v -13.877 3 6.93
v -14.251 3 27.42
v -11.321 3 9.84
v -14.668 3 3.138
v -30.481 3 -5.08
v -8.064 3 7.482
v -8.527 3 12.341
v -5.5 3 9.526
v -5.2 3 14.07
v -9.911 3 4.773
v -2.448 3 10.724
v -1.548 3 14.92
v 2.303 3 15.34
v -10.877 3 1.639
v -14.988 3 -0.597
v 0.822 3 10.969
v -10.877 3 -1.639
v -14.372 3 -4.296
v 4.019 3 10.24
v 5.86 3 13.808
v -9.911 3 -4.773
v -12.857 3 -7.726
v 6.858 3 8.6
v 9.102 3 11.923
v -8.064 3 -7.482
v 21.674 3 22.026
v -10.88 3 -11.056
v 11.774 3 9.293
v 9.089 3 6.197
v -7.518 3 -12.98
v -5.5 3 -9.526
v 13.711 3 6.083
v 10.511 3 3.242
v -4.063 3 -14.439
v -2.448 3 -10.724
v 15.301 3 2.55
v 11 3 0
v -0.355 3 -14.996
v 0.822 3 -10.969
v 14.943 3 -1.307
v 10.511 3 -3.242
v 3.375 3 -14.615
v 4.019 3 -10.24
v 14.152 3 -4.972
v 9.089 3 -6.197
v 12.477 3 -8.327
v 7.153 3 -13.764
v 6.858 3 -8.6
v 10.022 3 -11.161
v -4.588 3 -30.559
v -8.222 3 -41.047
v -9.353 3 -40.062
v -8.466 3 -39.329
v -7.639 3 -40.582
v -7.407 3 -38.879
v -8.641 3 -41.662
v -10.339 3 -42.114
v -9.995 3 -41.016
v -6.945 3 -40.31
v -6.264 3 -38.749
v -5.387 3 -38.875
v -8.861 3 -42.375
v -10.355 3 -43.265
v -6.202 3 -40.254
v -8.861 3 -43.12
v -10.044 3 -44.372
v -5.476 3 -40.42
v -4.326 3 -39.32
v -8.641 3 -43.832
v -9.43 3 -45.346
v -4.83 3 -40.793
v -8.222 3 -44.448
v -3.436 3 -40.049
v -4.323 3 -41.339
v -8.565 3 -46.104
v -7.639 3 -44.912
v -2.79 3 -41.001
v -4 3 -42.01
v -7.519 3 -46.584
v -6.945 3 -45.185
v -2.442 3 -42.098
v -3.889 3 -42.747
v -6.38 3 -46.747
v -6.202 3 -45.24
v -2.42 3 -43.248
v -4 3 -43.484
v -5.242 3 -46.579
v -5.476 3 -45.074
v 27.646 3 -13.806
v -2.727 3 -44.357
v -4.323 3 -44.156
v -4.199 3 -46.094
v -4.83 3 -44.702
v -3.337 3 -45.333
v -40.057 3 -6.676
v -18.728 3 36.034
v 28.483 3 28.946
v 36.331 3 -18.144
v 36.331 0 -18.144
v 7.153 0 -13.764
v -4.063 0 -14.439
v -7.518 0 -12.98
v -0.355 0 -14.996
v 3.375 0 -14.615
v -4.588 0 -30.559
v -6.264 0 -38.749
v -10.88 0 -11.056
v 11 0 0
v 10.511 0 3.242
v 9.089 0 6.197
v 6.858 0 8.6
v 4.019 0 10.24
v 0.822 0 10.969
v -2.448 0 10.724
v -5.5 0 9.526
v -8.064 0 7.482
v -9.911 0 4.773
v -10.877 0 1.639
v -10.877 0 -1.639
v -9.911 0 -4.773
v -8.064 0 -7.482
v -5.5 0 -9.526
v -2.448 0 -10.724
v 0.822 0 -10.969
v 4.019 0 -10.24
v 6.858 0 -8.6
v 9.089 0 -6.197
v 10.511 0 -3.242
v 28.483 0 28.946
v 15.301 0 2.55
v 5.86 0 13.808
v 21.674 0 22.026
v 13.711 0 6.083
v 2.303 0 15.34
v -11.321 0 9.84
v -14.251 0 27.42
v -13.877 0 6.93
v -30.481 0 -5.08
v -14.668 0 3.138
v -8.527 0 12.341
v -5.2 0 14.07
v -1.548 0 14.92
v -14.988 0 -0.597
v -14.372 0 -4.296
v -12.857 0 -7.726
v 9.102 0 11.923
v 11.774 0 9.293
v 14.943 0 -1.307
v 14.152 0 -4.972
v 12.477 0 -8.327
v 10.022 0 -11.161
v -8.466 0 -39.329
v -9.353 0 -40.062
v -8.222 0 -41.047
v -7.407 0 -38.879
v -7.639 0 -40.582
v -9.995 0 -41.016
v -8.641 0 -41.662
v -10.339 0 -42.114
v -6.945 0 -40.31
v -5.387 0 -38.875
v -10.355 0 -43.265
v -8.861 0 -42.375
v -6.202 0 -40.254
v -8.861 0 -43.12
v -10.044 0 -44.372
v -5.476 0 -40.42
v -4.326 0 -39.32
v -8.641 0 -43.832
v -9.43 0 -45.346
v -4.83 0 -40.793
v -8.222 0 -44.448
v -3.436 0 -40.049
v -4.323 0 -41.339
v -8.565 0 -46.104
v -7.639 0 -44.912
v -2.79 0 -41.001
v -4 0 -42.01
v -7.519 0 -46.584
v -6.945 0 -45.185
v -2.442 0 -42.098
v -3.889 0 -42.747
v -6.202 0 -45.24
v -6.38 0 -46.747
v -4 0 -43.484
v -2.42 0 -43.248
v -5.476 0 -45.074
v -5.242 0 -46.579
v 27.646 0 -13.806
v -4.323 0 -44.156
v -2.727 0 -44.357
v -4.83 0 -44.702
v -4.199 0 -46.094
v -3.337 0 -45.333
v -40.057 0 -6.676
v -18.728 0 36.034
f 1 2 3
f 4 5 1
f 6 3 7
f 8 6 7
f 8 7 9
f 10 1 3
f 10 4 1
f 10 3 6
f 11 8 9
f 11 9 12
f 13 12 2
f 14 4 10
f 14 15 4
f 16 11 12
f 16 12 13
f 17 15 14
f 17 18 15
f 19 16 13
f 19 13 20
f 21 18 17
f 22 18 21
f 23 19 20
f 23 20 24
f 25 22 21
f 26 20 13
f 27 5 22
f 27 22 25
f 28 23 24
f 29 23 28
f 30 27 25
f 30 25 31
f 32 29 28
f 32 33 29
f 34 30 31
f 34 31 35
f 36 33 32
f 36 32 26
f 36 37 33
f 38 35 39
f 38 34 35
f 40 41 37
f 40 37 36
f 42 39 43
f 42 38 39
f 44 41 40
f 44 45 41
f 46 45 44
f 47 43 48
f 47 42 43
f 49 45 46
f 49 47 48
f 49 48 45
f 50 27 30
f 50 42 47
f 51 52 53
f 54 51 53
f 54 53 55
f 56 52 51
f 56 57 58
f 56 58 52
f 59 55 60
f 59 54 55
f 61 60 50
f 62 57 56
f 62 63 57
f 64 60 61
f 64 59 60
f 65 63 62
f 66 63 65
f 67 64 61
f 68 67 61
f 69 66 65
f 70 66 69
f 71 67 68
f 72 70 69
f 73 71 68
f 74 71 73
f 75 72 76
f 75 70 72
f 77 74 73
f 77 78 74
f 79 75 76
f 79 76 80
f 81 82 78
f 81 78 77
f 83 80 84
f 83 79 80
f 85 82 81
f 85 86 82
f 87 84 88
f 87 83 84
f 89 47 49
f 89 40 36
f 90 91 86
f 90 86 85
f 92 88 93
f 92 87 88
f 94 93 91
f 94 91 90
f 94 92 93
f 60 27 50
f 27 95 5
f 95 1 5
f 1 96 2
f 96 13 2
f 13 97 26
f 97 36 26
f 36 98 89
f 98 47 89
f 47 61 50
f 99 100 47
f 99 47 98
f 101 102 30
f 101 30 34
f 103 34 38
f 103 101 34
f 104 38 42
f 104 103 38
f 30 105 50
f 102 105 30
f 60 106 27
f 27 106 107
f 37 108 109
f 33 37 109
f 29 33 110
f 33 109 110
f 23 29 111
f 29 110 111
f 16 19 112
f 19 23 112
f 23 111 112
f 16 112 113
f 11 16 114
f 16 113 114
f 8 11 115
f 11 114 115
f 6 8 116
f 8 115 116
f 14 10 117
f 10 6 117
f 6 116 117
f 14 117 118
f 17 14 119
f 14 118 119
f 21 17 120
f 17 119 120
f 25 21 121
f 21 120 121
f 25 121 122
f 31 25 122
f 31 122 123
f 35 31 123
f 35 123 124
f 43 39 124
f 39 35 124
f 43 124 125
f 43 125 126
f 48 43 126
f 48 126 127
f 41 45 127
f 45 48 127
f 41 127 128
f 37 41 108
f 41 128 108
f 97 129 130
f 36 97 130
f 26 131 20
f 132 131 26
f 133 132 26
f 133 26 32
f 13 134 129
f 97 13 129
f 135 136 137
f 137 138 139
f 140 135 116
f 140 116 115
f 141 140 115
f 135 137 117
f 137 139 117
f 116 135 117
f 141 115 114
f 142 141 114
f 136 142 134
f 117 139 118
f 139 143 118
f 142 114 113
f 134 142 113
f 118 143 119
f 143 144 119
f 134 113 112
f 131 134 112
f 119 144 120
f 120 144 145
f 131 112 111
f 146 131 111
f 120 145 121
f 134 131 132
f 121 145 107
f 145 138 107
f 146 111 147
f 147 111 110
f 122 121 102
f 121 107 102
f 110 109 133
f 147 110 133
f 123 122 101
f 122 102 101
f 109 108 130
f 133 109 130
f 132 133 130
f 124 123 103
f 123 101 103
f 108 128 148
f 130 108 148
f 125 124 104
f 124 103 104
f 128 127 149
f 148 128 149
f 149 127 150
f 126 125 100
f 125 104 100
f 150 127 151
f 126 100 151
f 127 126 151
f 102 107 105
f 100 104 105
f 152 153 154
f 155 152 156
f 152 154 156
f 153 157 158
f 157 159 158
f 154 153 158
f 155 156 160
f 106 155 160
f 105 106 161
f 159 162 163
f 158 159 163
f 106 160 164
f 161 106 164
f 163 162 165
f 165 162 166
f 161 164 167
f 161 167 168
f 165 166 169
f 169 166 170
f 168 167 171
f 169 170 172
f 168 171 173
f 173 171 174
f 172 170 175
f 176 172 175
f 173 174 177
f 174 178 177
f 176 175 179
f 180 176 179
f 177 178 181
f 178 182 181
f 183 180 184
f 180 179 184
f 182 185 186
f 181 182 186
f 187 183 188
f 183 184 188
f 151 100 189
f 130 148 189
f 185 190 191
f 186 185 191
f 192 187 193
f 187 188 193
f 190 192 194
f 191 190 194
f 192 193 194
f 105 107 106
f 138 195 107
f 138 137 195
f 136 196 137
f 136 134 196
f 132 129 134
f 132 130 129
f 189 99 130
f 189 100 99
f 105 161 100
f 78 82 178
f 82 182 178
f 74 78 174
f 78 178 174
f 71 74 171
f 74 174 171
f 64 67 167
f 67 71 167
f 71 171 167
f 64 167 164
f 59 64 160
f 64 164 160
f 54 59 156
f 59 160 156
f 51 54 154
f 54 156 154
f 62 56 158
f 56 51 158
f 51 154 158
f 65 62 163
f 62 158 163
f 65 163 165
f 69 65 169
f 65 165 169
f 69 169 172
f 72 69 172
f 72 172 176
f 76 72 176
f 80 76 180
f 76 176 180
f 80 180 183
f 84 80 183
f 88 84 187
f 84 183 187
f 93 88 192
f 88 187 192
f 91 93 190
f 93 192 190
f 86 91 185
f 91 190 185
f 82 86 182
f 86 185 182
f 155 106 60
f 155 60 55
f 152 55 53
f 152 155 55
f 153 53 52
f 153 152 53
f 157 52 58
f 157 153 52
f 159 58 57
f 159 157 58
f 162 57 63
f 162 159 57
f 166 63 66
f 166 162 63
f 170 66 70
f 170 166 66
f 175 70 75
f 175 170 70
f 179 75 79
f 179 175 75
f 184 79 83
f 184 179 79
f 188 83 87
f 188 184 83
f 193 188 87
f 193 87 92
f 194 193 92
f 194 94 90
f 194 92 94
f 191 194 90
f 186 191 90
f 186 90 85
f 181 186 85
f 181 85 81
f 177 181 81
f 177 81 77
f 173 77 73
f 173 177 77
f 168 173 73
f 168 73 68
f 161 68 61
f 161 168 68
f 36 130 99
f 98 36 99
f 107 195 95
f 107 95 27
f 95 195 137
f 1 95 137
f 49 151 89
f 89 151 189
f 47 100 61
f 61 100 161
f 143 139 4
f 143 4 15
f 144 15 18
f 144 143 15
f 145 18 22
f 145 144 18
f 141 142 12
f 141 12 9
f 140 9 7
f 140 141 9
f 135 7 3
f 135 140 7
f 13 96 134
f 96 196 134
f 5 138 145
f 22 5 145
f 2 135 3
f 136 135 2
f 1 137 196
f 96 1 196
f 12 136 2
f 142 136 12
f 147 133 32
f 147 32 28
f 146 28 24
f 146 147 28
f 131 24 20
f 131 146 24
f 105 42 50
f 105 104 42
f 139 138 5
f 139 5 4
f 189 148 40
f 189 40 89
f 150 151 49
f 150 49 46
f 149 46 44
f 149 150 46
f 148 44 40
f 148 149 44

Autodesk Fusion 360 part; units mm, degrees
sketch "草图1" plane through (0, 0, 0) normal (0, 1, 0) x (1, 0, 0)
  line L0 (-18.7279, -36.0337) -> (2.3028, -15.3397)
  line L1 (2.3028, -15.3397) -> (28.4829, -28.9463)
  line L2 (28.4829, -28.9463) -> (15.3006, -2.5501)
  line L3 (15.3006, -2.5501) -> (36.3313, 18.1439)
  line L4 (7.1534, 13.7637) -> (36.3313, 18.1439)
  line L5 (7.1534, 13.7637) -> (-6.0289, 40.1599)
  line L6 (-6.0289, 40.1599) -> (-10.8795, 11.0565)
  line L7 (-40.0574, 6.6762) -> (-10.8795, 11.0565)
  line L8 (-40.0574, 6.6762) -> (-13.8773, -6.9304)
  line L9 (-13.8773, -6.9304) -> (-18.7279, -36.0337)
  line L10 (-30.4812, 5.0802) -> (-12.8573, 7.726)
  line L11 (10.0219, 11.1607) -> (27.6459, 13.8065)
  line L12 (-4.5877, 30.5593) -> (-7.5175, 12.9803)
  line L13 (-11.321, -9.8405) -> (-14.2508, -27.4195)
  line L14 (-30.4812, 5.0802) -> (-14.668, -3.1384)
  line L15 (5.8605, -13.8078) -> (21.6738, -22.0264)
  line L16 (-14.2508, -27.4195) -> (-1.5478, -14.9199)
  line L17 (14.943, 1.3069) -> (27.6459, 13.8065)
  line L18 (21.6738, -22.0264) -> (13.7114, -6.0826)
  line L19 (3.3747, 14.6154) -> (-4.5877, 30.5593)
  circle A0 centre (0, 0) radius 11
  arc A1 (-12.8573, 7.726) -> (-14.668, -3.1384) centre (0, 0) ccw
  arc A2 (3.3747, 14.6154) -> (-7.5175, 12.9803) centre (0, 0) ccw
  arc A3 (14.943, 1.3069) -> (10.0219, 11.1607) centre (0, 0) ccw
  arc A4 (-11.321, -9.8405) -> (-1.5478, -14.9199) centre (0, 0) ccw
  arc A5 (5.8605, -13.8078) -> (13.7114, -6.0826) centre (0, 0) ccw
  dimension "d3" = 30
  dimension "d8" = 22
sketch "草图3" plane through (0, 0, 0) normal (0, 1, 0) x (1, 0, 0)
  circle A0 centre (-75, 0) radius 2.5
  circle A1 centre (-75, 0) radius 4
  dimension "d4" = 5
  dimension "d5" = 8
extrude "拉伸1" add sketch "草图3" along normal blind 3 makes body 1
extrude "拉伸2" add sketch "草图1" along normal blind 3 separate body makes body 2
move_body "移动1" bodies 1 to x (1, 0, 0) y (0, 1, 0) z (0, 0, 1) at (69.0763, 0, -40.5763)
move_body "移动2" bodies 1 to x (1, 0, 0) y (0, 1, 0) z (0, 0, 1) at (-0.4652, 0, -2.1709)
combine "合并1" operation add target body 2 tool bodies 1
